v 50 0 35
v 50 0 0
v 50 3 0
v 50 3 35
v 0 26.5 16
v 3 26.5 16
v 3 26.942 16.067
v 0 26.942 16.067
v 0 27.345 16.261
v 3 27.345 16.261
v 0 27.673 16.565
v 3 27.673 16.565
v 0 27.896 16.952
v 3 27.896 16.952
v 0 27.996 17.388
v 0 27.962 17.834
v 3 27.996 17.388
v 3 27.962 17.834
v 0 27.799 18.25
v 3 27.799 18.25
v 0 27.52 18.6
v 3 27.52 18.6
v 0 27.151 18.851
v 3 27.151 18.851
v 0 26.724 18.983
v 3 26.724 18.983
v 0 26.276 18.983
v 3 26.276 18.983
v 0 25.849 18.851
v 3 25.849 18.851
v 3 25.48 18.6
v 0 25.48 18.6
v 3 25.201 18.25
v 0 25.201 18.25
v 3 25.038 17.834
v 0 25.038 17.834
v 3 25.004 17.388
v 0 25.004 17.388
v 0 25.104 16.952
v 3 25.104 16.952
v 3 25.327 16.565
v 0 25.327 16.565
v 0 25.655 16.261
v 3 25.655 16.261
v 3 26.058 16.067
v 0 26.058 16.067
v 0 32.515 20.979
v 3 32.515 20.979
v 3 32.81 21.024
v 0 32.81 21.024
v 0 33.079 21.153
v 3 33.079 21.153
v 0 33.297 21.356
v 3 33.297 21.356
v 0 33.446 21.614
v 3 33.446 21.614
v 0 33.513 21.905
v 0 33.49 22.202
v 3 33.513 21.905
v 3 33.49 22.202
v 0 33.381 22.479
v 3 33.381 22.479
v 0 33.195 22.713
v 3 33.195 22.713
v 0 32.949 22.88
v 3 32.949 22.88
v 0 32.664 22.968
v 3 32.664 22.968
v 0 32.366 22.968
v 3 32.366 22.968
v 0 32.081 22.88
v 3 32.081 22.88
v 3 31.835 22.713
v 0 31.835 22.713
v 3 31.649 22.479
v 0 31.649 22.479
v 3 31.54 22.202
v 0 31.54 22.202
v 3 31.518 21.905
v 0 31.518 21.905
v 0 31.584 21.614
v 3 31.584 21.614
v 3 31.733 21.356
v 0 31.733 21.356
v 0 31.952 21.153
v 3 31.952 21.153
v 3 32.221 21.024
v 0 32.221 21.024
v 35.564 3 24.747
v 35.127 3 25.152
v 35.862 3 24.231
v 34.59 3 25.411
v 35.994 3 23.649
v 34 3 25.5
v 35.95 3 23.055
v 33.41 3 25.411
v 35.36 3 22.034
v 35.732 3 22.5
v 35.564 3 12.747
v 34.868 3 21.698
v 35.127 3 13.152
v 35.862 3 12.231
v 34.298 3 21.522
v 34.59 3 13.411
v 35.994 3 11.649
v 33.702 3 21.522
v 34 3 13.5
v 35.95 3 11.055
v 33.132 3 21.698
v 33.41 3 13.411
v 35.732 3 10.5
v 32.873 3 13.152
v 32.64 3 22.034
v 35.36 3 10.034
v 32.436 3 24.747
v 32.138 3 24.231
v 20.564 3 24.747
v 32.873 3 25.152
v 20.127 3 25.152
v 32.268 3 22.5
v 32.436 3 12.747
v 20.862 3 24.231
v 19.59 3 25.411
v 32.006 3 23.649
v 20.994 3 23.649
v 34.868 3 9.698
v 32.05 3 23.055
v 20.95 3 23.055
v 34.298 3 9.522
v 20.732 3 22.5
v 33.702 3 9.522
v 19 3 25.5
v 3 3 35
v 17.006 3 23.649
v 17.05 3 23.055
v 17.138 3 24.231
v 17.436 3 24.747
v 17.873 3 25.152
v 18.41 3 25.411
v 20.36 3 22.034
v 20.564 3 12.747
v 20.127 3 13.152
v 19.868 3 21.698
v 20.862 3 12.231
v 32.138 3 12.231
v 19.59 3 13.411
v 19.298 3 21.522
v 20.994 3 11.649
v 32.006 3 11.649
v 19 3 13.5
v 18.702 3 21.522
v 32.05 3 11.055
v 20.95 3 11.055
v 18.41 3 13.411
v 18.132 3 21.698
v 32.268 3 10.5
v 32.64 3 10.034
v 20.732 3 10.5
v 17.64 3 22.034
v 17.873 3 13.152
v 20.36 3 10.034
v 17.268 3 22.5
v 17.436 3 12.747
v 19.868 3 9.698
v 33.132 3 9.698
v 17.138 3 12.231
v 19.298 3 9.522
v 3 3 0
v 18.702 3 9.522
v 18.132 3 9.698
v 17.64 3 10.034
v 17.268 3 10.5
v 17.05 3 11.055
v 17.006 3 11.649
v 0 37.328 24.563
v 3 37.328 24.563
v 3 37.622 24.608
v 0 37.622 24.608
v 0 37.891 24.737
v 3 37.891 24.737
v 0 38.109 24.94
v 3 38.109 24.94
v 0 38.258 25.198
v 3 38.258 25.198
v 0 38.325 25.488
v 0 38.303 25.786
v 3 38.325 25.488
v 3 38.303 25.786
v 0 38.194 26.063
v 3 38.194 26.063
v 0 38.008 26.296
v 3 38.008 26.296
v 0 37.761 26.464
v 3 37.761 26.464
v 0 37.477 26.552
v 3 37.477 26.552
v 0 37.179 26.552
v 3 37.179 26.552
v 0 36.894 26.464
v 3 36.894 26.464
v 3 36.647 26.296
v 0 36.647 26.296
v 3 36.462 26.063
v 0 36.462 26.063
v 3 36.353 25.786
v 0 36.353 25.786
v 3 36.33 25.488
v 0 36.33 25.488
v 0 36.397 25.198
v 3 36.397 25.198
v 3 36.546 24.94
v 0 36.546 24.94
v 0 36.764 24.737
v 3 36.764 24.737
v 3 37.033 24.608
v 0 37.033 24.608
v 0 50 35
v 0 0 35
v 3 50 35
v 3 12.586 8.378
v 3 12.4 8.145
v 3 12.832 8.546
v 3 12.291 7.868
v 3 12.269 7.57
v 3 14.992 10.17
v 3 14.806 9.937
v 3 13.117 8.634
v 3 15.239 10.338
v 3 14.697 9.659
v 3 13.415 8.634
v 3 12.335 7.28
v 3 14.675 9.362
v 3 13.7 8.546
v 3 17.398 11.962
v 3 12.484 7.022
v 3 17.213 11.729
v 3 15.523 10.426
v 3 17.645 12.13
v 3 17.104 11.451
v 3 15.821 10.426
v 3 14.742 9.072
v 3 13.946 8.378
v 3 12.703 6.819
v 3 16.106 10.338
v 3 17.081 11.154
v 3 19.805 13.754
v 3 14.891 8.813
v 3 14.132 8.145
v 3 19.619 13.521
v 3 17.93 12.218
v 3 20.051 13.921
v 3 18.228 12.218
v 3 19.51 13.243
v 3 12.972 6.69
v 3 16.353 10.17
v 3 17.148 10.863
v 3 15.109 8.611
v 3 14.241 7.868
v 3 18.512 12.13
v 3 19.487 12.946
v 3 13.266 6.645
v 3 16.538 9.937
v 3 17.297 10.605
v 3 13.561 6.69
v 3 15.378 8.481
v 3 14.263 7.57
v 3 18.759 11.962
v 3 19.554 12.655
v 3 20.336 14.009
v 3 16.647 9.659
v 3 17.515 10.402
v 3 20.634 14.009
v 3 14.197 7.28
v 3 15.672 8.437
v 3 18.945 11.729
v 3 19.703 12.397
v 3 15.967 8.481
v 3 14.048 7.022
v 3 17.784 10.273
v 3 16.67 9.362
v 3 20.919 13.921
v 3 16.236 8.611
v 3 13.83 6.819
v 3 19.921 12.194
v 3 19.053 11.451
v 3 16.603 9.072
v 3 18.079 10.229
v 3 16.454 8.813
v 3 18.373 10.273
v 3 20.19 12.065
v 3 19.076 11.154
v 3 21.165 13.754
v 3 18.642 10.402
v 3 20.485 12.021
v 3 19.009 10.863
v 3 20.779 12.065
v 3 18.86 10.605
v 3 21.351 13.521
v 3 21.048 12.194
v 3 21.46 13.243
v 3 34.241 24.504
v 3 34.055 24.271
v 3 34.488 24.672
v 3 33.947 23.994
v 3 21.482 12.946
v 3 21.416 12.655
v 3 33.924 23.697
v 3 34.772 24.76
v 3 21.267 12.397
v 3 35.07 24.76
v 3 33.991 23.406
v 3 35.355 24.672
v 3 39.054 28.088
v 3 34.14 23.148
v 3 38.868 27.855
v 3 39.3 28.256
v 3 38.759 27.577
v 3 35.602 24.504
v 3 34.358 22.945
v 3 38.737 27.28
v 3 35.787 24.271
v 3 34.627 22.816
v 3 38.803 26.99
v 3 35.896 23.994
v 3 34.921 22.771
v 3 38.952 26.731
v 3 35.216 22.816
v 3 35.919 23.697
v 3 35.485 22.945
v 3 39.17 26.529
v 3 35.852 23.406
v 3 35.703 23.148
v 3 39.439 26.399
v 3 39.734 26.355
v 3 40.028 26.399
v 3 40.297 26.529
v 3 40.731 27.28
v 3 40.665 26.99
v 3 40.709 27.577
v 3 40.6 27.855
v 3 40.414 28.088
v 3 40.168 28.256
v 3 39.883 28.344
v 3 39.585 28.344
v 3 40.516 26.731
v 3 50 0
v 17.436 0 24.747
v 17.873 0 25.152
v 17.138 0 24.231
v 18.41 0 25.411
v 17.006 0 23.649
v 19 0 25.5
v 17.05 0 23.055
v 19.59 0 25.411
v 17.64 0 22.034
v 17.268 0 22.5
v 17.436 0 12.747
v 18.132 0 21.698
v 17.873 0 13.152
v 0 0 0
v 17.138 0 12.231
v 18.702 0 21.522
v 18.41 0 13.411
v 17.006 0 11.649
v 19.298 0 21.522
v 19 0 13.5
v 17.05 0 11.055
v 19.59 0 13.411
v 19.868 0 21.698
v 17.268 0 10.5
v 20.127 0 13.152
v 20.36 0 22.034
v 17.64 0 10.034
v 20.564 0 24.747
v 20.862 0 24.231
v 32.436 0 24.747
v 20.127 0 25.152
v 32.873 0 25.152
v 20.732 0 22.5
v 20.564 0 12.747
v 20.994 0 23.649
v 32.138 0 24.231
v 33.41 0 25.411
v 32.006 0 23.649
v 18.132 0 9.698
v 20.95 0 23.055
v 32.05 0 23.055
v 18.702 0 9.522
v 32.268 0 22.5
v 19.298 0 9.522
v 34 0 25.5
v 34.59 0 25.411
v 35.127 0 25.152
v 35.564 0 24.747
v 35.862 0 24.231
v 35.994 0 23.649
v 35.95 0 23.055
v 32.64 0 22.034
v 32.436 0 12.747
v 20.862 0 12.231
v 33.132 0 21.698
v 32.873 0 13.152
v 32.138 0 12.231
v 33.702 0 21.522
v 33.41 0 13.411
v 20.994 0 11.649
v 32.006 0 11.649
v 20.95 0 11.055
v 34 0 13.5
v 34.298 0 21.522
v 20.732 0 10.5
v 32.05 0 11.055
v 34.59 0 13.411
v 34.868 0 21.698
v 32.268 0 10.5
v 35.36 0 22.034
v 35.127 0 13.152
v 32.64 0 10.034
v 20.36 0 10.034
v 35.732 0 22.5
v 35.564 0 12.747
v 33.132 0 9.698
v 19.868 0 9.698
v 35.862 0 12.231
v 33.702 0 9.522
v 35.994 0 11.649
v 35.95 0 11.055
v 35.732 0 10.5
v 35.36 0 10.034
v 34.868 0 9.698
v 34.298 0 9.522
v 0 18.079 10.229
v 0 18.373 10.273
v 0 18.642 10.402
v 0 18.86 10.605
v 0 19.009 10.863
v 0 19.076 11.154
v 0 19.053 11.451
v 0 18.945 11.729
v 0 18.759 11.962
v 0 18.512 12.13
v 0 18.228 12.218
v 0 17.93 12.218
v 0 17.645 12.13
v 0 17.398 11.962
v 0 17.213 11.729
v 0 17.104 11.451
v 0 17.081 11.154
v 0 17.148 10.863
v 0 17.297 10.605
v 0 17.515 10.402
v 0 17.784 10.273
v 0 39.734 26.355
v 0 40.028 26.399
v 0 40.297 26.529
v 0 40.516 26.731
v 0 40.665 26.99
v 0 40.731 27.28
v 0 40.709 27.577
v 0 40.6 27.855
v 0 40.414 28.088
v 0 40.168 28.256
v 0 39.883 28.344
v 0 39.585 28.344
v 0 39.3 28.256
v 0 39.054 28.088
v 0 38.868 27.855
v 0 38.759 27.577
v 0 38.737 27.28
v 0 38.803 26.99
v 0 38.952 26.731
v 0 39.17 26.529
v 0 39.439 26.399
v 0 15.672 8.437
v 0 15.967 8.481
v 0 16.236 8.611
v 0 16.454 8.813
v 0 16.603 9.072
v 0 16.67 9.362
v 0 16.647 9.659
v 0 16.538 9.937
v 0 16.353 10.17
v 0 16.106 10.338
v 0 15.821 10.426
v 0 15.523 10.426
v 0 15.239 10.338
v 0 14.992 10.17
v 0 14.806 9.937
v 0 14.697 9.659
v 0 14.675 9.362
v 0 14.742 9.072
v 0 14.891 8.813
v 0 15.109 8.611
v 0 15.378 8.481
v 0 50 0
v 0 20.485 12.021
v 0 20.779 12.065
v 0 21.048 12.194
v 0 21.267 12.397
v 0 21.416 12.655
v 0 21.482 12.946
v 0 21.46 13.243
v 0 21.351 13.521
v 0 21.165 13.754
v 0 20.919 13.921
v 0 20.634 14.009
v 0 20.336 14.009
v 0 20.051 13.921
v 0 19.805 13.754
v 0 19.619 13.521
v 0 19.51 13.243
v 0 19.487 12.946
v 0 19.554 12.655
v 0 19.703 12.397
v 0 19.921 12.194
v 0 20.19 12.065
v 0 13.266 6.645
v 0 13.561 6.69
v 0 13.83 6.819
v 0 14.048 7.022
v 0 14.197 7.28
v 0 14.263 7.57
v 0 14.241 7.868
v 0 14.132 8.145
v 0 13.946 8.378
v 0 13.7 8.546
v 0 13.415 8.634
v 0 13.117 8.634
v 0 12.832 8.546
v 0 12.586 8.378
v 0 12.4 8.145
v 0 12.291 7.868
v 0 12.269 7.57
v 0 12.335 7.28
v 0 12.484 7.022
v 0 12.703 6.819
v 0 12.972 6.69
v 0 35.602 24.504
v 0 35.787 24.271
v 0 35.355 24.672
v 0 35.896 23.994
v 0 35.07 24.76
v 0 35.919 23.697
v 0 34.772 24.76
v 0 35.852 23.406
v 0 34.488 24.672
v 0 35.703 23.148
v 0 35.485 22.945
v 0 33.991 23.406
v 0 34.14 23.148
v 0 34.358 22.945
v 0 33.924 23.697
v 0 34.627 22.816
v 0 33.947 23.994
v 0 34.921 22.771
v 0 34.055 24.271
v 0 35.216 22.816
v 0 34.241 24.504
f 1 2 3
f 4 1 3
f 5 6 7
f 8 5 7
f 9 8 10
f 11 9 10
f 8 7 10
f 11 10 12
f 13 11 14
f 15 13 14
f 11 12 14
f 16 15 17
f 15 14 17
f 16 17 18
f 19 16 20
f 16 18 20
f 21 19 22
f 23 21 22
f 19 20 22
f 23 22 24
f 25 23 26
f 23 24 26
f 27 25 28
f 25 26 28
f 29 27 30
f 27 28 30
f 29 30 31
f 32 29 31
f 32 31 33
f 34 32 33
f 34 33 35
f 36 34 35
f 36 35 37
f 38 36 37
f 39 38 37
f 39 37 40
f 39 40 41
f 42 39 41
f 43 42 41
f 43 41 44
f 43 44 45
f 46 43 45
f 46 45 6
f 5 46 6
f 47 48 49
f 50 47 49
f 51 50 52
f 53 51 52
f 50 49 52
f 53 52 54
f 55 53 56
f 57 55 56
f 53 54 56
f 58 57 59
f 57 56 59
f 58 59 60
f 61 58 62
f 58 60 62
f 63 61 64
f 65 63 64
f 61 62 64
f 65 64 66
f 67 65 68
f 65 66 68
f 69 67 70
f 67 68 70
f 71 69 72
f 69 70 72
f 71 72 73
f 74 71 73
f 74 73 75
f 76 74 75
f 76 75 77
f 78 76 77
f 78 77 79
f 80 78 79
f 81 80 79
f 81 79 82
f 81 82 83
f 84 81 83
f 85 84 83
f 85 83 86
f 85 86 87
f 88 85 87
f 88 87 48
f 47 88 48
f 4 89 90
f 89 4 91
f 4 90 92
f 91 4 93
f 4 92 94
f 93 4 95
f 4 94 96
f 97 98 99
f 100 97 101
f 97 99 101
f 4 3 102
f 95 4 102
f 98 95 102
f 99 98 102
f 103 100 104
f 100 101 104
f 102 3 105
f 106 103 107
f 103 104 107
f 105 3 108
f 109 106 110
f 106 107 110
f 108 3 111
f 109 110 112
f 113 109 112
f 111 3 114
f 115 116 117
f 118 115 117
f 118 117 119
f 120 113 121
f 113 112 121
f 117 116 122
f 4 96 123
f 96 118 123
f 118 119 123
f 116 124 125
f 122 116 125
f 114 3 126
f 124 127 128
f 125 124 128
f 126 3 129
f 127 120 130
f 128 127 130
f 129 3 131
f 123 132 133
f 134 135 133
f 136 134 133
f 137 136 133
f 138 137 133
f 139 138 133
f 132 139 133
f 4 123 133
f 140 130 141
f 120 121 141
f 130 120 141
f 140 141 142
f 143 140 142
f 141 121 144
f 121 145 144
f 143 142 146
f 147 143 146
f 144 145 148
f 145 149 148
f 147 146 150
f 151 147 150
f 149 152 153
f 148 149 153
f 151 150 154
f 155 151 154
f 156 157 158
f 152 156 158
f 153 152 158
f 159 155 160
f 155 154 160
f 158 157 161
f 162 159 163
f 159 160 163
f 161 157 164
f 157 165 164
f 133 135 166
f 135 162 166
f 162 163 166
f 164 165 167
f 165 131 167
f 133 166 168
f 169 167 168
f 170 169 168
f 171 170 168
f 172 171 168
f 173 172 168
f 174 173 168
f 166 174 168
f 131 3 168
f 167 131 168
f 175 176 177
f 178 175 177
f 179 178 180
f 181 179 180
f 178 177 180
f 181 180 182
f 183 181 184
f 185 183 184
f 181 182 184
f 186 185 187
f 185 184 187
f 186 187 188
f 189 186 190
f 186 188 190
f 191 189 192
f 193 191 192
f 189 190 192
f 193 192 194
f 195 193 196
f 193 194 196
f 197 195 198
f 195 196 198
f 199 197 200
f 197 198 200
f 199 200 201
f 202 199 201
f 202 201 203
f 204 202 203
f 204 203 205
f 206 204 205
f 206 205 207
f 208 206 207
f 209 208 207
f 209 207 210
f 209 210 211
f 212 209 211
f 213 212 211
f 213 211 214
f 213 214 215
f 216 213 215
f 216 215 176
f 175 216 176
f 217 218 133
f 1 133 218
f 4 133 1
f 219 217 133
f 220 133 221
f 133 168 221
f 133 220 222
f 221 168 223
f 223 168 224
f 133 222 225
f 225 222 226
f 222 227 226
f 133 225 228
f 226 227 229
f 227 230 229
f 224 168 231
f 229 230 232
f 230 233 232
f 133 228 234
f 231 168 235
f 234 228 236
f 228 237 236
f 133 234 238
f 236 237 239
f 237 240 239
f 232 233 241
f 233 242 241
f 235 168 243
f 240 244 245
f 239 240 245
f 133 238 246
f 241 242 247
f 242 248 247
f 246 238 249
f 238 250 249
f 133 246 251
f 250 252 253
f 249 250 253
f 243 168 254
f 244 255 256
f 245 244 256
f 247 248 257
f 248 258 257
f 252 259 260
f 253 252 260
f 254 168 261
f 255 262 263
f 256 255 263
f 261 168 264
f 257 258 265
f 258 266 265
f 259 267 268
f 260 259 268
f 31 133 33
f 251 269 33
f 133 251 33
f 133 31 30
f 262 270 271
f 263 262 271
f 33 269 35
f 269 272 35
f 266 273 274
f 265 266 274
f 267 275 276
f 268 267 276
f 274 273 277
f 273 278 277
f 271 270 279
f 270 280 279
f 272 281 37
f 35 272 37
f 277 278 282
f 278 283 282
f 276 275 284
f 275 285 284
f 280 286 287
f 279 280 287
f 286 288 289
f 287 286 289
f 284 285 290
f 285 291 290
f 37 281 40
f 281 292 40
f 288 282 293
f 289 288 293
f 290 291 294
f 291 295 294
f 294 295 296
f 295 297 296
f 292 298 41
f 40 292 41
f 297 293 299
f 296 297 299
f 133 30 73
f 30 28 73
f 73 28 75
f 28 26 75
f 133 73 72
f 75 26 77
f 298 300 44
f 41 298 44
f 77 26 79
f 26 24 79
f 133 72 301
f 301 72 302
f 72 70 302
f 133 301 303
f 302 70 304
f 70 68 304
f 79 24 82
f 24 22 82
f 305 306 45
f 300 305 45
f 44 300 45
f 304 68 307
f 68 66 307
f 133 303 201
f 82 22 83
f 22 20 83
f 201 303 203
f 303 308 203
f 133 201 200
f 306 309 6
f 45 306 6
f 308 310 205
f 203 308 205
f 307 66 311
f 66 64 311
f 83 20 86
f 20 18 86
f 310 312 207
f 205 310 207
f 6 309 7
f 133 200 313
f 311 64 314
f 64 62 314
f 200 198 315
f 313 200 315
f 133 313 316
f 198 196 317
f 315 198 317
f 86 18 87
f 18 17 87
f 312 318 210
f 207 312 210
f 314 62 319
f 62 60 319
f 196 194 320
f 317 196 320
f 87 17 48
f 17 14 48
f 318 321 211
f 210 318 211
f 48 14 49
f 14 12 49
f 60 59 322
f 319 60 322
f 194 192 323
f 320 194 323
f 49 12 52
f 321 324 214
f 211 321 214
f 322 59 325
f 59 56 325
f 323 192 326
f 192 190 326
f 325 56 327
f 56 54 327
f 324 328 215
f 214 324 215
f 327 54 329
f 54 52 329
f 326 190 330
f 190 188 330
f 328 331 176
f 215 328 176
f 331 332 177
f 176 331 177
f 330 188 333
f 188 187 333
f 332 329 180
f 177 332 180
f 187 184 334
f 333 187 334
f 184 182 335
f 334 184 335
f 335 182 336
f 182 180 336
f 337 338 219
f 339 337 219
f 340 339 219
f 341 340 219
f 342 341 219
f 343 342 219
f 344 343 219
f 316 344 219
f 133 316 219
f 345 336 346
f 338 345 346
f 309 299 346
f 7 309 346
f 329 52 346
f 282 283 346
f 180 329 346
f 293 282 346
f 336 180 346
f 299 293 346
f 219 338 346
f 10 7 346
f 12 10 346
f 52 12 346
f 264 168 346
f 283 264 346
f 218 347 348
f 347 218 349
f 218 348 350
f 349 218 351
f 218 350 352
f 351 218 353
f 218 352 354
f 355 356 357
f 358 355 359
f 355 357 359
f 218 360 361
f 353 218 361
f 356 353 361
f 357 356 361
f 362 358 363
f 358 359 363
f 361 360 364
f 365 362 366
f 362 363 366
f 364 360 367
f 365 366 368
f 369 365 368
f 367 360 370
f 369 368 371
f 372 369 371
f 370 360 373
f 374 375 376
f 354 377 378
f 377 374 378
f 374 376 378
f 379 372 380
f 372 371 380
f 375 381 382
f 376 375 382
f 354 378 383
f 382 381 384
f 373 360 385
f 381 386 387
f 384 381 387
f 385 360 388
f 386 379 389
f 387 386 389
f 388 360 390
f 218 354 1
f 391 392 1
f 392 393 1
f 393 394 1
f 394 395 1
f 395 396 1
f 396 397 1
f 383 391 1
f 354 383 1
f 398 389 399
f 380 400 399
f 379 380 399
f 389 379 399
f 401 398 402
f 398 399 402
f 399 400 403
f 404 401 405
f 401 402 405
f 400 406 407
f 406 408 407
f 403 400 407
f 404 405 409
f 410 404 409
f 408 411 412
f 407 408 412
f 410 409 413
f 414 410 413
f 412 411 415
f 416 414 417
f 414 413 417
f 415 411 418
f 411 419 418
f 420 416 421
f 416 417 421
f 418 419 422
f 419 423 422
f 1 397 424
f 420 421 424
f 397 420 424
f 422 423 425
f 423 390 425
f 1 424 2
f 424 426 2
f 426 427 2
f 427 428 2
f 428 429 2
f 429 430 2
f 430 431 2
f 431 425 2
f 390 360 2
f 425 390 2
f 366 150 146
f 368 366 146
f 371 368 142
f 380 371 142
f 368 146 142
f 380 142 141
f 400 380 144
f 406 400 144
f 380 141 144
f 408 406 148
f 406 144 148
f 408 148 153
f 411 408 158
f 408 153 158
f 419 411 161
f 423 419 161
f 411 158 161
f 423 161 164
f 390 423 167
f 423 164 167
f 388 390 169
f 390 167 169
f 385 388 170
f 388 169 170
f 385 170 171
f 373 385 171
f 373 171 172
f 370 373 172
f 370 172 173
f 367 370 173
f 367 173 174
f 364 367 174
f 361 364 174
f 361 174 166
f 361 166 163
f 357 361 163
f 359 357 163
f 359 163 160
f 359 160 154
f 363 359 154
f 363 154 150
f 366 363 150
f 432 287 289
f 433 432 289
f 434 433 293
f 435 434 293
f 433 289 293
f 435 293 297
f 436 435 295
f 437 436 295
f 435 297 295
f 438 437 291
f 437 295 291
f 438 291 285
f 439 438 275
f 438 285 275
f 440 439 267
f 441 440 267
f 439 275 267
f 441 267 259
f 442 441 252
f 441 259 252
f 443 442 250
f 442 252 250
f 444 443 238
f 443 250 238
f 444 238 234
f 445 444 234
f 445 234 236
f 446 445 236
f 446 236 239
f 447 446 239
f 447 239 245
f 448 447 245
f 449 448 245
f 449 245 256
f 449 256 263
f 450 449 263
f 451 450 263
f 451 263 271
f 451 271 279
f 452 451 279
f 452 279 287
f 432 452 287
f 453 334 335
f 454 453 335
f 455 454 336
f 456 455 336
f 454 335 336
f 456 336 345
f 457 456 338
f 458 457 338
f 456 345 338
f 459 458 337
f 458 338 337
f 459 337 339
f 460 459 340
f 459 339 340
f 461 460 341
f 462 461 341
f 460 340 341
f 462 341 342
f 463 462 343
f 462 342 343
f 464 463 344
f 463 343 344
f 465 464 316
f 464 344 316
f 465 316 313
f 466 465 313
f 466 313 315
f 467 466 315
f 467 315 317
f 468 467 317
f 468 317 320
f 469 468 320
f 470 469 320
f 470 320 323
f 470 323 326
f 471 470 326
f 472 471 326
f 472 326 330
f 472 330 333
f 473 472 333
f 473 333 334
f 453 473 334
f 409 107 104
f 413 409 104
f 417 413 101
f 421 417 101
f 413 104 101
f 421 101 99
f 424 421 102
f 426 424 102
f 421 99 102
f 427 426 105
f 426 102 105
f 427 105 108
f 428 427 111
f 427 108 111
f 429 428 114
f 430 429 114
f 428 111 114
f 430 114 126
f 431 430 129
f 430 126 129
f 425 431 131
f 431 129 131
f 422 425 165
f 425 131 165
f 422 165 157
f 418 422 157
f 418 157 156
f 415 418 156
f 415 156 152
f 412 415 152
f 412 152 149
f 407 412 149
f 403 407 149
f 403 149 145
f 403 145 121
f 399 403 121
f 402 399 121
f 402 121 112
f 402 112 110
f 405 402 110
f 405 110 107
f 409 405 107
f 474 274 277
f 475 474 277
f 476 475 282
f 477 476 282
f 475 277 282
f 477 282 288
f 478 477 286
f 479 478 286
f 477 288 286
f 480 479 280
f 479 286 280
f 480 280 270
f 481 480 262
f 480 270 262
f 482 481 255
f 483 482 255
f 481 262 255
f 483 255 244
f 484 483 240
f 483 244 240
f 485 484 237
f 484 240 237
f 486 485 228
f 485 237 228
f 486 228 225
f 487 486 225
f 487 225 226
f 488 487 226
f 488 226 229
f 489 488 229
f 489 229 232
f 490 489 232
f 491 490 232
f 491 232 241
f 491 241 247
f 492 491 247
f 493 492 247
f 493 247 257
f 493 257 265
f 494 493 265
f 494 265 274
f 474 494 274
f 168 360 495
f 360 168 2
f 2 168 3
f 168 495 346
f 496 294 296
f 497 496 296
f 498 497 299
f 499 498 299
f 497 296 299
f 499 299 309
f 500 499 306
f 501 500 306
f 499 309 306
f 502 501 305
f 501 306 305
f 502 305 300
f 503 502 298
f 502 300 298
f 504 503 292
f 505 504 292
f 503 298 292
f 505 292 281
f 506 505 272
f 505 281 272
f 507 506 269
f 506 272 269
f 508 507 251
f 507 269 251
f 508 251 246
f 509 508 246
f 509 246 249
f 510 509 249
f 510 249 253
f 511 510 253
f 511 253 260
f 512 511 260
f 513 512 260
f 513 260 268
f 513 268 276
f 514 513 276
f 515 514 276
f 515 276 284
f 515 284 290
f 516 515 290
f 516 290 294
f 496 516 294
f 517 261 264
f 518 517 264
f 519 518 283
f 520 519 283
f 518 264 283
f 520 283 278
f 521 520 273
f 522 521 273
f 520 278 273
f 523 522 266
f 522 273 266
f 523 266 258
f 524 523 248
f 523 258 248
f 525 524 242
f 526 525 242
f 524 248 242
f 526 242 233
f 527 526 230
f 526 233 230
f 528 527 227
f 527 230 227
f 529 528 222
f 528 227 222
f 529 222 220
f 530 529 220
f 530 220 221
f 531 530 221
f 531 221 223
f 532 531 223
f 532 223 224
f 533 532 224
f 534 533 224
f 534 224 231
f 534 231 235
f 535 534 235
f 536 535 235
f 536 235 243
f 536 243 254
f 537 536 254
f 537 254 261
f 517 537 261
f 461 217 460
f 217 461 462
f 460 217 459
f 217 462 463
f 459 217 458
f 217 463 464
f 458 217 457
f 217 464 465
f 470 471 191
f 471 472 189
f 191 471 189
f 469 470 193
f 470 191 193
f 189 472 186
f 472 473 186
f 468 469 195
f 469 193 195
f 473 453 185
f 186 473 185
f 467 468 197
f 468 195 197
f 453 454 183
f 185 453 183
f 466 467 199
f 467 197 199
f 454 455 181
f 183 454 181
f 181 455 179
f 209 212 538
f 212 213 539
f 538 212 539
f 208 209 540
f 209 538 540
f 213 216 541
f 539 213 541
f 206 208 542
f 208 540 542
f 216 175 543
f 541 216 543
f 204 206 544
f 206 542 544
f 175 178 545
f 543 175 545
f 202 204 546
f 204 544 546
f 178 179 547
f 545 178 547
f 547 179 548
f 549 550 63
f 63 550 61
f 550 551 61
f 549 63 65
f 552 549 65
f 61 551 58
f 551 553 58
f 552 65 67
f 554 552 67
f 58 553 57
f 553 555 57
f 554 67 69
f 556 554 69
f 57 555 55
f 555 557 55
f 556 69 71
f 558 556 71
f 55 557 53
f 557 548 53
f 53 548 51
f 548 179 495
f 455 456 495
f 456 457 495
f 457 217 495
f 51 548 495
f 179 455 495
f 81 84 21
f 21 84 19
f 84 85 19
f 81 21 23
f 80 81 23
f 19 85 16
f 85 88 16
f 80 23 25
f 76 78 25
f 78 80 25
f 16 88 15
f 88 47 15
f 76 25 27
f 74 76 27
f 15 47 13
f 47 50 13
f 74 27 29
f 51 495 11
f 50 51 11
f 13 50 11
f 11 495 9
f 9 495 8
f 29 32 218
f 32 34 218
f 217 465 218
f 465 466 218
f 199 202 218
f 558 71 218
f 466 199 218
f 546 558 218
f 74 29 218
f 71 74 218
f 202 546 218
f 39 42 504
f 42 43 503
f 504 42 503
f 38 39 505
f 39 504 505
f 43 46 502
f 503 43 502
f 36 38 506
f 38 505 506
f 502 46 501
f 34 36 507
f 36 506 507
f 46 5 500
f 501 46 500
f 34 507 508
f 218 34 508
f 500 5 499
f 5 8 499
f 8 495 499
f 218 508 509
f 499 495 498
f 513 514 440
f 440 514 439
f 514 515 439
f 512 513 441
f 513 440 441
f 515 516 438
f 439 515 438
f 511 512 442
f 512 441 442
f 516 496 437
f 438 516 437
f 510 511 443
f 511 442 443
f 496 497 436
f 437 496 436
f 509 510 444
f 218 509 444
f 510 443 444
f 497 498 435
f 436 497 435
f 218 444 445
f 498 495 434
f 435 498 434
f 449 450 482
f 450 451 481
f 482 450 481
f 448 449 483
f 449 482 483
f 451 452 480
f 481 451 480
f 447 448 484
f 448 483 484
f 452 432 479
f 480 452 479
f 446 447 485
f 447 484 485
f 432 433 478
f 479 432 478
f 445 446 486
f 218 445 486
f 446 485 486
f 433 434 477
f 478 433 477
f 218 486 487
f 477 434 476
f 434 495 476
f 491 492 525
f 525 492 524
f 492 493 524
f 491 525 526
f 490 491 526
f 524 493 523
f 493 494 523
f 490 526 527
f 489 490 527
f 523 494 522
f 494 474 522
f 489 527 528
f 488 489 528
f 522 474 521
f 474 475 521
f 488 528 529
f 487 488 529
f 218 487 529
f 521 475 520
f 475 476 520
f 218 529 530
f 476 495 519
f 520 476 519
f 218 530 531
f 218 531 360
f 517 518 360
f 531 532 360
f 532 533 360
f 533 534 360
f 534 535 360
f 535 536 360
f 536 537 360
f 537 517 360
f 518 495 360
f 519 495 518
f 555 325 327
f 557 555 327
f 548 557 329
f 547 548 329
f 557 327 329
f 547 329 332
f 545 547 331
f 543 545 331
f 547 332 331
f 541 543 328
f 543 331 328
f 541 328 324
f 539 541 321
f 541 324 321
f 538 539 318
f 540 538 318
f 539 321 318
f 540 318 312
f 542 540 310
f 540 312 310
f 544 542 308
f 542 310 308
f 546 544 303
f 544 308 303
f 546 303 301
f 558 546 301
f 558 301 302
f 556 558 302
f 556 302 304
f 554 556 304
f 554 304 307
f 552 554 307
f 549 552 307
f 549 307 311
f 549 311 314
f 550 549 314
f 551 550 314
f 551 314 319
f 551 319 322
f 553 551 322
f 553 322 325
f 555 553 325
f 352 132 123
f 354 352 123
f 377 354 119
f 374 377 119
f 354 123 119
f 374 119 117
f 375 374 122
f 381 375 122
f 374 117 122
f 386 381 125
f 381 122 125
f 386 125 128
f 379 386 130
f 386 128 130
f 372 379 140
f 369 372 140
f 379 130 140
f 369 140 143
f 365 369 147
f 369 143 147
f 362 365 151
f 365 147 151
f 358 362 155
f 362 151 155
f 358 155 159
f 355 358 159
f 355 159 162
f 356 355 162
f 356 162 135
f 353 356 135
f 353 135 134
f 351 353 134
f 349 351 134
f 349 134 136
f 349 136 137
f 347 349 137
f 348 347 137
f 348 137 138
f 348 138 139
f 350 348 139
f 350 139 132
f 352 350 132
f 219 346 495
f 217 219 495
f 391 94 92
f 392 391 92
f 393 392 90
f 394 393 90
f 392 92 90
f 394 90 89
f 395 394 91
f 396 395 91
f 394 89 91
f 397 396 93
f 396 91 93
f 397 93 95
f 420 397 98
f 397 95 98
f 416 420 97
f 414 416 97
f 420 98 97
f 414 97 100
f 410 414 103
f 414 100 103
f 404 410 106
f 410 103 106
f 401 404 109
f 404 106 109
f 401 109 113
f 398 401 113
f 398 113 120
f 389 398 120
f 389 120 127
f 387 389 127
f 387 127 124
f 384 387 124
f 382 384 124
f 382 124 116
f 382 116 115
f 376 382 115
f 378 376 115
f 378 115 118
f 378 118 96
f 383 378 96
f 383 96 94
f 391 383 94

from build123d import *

# Parameters (mm, degrees)
BOSS_EXTRUDE1_DEPTH = 35
SKETCH2_R           = 2
CUT_EXTRUDE1_DEPTH  = 50
SKETCH3_R           = 1.5
SKETCH3_R_2         = 1
CUT_EXTRUDE2_DEPTH  = 50


with BuildPart() as part:
    # Sketch1 → Boss-Extrude1 (new body)
    with BuildSketch(Plane.XY):
        Polygon((0, 50), (0, 0), (50, 0), (50, 3), (3, 3), (3, 50), align=None)
    extrude(amount=BOSS_EXTRUDE1_DEPTH)

    # Sketch2 → Cut-Extrude1 (cut)
    with BuildSketch(Plane(origin=(0, 3, 0), x_dir=(1, 0, 0), z_dir=(0, 1, 0))):
        with Locations(Location((19, -11.5, 0), (0, 0, 270))):
            Circle(SKETCH2_R)
        with Locations(Location((34, -11.5, 0), (0, 0, 270))):
            Circle(SKETCH2_R)
        with Locations(Location((34, -23.5, 0), (0, 0, 270))):
            Circle(SKETCH2_R)
        with Locations(Location((19, -23.5, 0), (0, 0, 270))):
            Circle(SKETCH2_R)
    extrude(amount=-CUT_EXTRUDE1_DEPTH, mode=Mode.SUBTRACT)

    # Sketch3 → Cut-Extrude2 (cut)
    with BuildSketch(Plane(origin=(3, 0, 0), x_dir=(0, 0, -1), z_dir=(1, 0, 0))):
        with Locations((-17.5, 26.5)):
            Circle(SKETCH3_R)
        with Locations((-13.020503905, 20.484676672)):
            Circle(SKETCH3_R_2)
        with Locations((-21.979496095, 32.515323328)):
            Circle(SKETCH3_R_2)
        with Locations((-23.771294533, 34.921452659)):
            Circle(SKETCH3_R_2)
        with Locations((-25.563092971, 37.32758199)):
            Circle(SKETCH3_R_2)
        with Locations((-27.354891409, 39.733711321)):
            Circle(SKETCH3_R_2)
        with Locations((-11.228705467, 18.078547341)):
            Circle(SKETCH3_R_2)
        with Locations((-9.436907029, 15.67241801)):
            Circle(SKETCH3_R_2)
        with Locations((-7.645108591, 13.266288679)):
            Circle(SKETCH3_R_2)
    extrude(amount=-CUT_EXTRUDE2_DEPTH, mode=Mode.SUBTRACT)


solid = part.part
